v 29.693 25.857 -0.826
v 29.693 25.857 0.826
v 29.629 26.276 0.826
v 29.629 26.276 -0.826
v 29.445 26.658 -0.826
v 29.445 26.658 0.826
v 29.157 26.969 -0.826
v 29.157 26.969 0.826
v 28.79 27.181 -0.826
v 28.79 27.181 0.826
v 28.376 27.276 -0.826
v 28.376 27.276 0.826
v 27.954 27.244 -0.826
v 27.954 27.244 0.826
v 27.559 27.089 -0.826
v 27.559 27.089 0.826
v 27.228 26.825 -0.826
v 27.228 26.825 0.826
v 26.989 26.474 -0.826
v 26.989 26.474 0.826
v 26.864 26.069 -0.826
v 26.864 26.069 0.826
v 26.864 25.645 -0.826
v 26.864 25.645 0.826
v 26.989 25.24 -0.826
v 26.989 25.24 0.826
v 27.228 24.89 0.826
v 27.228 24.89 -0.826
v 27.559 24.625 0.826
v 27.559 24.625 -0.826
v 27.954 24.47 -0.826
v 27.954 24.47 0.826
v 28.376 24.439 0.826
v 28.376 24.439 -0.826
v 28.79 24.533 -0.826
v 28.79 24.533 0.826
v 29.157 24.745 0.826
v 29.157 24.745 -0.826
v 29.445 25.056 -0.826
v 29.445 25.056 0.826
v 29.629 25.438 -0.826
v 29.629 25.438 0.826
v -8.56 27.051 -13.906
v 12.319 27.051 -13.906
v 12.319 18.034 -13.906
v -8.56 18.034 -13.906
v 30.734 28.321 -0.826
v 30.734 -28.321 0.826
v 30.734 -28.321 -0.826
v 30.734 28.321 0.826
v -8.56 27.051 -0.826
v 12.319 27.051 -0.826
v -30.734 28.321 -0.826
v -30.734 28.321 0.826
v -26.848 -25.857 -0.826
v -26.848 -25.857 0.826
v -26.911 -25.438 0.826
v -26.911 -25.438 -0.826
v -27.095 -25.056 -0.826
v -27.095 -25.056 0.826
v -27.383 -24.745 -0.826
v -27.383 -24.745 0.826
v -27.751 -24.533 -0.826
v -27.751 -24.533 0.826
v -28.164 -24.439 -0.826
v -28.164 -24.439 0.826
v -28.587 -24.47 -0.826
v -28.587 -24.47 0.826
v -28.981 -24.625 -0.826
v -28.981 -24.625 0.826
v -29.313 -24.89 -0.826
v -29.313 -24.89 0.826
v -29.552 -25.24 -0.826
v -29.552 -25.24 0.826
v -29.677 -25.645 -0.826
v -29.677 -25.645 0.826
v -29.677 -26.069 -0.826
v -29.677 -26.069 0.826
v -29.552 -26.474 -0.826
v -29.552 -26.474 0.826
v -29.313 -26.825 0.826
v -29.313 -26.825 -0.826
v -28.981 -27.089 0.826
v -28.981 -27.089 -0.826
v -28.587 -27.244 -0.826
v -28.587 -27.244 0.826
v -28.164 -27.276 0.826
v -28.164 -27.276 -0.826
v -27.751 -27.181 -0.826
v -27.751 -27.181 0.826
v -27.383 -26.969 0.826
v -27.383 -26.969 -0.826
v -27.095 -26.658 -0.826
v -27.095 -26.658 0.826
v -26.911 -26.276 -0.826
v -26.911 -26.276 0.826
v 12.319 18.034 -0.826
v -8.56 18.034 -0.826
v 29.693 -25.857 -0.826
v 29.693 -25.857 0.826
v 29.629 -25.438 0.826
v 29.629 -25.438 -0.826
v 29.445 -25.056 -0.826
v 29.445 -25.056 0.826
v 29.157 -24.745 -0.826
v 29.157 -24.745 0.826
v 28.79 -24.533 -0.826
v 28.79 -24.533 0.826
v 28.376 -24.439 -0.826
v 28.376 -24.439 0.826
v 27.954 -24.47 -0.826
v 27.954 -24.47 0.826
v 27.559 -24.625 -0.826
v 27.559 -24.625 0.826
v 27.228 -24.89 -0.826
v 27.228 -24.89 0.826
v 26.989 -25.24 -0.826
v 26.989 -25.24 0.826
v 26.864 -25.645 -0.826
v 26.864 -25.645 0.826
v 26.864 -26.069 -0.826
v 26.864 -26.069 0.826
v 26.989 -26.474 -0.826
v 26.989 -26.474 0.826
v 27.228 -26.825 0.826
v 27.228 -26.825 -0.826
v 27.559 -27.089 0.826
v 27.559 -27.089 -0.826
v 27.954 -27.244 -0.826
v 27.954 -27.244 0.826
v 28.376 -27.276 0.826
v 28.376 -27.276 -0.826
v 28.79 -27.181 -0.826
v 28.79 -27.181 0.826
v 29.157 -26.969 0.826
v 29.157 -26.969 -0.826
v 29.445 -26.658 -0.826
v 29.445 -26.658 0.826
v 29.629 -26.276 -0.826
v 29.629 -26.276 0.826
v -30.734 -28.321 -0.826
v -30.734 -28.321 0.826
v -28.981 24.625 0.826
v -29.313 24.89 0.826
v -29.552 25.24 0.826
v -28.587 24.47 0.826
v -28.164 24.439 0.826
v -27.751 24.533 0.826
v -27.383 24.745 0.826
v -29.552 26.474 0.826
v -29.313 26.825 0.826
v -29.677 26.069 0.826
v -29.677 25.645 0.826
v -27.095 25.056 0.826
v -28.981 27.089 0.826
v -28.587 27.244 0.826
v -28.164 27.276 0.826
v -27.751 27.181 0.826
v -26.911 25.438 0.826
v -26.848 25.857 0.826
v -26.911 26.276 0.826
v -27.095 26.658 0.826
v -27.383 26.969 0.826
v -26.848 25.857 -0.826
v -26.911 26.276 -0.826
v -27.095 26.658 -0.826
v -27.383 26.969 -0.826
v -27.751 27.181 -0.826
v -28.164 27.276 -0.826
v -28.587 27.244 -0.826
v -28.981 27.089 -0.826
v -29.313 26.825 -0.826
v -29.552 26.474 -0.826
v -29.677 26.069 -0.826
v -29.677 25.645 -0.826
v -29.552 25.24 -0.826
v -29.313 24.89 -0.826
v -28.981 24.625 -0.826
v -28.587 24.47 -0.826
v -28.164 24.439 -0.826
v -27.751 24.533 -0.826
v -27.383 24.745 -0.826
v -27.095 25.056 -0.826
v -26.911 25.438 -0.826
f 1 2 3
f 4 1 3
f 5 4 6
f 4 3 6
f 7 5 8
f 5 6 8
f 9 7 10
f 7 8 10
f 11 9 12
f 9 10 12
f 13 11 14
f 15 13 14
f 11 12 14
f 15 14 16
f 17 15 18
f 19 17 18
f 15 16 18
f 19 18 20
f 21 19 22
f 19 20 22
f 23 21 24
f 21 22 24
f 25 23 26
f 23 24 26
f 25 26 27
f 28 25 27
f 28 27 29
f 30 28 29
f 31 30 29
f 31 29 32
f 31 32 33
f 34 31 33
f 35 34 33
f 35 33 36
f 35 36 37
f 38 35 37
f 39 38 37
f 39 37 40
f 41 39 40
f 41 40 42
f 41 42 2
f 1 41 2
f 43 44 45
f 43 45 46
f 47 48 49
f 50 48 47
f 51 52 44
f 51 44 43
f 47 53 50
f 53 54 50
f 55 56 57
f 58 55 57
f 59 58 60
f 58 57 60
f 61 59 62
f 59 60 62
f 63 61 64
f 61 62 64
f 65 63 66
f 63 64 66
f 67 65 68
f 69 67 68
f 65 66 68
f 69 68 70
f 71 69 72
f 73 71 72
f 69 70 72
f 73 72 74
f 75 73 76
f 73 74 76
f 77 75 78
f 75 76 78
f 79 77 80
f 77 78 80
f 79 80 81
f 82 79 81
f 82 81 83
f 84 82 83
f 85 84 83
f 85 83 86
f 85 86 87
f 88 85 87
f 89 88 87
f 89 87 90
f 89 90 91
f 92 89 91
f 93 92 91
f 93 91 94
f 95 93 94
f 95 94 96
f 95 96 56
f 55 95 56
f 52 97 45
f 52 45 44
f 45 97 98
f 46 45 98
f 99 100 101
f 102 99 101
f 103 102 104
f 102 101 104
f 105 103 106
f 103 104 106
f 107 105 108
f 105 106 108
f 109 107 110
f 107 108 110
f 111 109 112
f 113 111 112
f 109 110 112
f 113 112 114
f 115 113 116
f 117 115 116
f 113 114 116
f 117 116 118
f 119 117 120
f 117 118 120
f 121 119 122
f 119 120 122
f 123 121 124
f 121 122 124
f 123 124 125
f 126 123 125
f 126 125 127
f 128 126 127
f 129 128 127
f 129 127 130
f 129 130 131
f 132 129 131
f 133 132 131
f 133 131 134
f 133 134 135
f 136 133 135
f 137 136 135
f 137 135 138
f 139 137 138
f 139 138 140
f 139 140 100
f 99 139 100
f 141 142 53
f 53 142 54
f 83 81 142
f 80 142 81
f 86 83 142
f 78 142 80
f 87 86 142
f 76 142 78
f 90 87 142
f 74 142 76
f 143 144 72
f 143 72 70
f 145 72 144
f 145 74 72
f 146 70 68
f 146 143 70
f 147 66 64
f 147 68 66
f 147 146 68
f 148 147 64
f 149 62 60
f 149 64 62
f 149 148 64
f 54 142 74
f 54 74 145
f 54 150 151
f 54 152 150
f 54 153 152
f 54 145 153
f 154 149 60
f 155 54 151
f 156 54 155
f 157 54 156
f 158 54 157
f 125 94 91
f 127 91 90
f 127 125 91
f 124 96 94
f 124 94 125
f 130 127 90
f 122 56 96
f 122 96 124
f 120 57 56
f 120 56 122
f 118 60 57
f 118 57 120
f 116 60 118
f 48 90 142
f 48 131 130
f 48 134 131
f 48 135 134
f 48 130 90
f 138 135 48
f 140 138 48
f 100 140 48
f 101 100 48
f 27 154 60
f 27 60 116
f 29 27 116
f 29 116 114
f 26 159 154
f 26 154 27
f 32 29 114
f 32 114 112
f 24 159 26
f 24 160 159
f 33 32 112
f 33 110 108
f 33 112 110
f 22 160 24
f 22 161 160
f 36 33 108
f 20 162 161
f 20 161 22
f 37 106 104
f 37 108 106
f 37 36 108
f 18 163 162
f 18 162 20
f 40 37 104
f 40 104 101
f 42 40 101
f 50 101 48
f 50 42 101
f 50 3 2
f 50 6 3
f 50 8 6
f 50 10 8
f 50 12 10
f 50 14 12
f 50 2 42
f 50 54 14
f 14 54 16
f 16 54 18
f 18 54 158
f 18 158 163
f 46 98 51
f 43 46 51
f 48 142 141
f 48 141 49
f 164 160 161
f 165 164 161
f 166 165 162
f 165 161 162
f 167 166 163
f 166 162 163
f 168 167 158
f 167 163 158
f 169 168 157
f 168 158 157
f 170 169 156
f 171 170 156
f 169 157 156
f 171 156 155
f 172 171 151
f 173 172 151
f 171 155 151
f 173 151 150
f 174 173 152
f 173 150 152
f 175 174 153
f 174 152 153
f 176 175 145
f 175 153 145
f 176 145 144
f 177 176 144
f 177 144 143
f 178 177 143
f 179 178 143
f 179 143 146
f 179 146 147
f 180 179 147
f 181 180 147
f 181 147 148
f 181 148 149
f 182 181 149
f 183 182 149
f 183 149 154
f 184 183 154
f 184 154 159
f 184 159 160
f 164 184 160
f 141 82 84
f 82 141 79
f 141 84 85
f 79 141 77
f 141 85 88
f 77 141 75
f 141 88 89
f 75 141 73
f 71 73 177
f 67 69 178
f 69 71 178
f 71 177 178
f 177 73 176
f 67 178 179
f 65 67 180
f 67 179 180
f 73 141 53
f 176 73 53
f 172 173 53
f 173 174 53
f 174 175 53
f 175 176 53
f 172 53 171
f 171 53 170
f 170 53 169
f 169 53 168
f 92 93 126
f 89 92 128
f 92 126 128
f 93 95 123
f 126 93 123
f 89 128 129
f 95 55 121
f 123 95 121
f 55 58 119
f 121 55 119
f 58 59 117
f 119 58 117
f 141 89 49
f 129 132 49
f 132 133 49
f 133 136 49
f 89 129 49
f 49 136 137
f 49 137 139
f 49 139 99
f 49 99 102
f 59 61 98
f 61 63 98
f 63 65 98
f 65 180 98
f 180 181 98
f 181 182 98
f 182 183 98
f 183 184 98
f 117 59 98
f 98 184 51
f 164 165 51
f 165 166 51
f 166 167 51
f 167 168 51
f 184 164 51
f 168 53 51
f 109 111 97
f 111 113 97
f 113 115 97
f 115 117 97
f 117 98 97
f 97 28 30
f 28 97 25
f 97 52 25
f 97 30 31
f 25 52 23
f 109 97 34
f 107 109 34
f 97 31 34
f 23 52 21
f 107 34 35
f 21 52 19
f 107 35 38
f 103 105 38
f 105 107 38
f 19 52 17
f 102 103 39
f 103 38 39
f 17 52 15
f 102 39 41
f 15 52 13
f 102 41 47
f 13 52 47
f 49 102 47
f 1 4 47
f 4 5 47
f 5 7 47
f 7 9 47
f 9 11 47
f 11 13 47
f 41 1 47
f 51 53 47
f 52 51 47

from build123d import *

# Parameters (mm, degrees)
SKETCH1_W           = 61.468
SKETCH1_H           = 56.642
BOSS_EXTRUDE1_DEPTH = 0.8255
SKETCH6_W           = 20.8788
SKETCH6_H           = 9.017
BOSS_EXTRUDE3_DEPTH = 13.081
SKETCH3_R           = 1.4224
CUT_EXTRUDE1_DEPTH  = 45.313537672


with BuildPart() as part:
    # Sketch1 → Boss-Extrude1 (new, symmetric)
    with BuildSketch(Plane.XY):
        Rectangle(SKETCH1_W, SKETCH1_H)
    extrude(amount=BOSS_EXTRUDE1_DEPTH, both=True)

    # Sketch6 → Boss-Extrude3 (add)
    with BuildSketch(Plane(origin=(0, 0, -0.8255), x_dir=(-1, 0, 0), z_dir=(0, 0, -1))):
        with Locations((-1.8796, 22.5425)):
            Rectangle(SKETCH6_W, SKETCH6_H)
    extrude(amount=BOSS_EXTRUDE3_DEPTH)

    # Sketch3 → Cut-Extrude1 (cut, through all)
    with BuildSketch(Plane.XY.offset(0.8255)):
        with Locations((-28.2702, 25.8572)):
            Circle(SKETCH3_R)
        with Locations((28.2702, 25.8572)):
            Circle(SKETCH3_R)
        with Locations((28.2702, -25.8572)):
            Circle(SKETCH3_R)
        with Locations((-28.2702, -25.8572)):
            Circle(SKETCH3_R)
    extrude(amount=-CUT_EXTRUDE1_DEPTH, mode=Mode.SUBTRACT)


solid = part.part
